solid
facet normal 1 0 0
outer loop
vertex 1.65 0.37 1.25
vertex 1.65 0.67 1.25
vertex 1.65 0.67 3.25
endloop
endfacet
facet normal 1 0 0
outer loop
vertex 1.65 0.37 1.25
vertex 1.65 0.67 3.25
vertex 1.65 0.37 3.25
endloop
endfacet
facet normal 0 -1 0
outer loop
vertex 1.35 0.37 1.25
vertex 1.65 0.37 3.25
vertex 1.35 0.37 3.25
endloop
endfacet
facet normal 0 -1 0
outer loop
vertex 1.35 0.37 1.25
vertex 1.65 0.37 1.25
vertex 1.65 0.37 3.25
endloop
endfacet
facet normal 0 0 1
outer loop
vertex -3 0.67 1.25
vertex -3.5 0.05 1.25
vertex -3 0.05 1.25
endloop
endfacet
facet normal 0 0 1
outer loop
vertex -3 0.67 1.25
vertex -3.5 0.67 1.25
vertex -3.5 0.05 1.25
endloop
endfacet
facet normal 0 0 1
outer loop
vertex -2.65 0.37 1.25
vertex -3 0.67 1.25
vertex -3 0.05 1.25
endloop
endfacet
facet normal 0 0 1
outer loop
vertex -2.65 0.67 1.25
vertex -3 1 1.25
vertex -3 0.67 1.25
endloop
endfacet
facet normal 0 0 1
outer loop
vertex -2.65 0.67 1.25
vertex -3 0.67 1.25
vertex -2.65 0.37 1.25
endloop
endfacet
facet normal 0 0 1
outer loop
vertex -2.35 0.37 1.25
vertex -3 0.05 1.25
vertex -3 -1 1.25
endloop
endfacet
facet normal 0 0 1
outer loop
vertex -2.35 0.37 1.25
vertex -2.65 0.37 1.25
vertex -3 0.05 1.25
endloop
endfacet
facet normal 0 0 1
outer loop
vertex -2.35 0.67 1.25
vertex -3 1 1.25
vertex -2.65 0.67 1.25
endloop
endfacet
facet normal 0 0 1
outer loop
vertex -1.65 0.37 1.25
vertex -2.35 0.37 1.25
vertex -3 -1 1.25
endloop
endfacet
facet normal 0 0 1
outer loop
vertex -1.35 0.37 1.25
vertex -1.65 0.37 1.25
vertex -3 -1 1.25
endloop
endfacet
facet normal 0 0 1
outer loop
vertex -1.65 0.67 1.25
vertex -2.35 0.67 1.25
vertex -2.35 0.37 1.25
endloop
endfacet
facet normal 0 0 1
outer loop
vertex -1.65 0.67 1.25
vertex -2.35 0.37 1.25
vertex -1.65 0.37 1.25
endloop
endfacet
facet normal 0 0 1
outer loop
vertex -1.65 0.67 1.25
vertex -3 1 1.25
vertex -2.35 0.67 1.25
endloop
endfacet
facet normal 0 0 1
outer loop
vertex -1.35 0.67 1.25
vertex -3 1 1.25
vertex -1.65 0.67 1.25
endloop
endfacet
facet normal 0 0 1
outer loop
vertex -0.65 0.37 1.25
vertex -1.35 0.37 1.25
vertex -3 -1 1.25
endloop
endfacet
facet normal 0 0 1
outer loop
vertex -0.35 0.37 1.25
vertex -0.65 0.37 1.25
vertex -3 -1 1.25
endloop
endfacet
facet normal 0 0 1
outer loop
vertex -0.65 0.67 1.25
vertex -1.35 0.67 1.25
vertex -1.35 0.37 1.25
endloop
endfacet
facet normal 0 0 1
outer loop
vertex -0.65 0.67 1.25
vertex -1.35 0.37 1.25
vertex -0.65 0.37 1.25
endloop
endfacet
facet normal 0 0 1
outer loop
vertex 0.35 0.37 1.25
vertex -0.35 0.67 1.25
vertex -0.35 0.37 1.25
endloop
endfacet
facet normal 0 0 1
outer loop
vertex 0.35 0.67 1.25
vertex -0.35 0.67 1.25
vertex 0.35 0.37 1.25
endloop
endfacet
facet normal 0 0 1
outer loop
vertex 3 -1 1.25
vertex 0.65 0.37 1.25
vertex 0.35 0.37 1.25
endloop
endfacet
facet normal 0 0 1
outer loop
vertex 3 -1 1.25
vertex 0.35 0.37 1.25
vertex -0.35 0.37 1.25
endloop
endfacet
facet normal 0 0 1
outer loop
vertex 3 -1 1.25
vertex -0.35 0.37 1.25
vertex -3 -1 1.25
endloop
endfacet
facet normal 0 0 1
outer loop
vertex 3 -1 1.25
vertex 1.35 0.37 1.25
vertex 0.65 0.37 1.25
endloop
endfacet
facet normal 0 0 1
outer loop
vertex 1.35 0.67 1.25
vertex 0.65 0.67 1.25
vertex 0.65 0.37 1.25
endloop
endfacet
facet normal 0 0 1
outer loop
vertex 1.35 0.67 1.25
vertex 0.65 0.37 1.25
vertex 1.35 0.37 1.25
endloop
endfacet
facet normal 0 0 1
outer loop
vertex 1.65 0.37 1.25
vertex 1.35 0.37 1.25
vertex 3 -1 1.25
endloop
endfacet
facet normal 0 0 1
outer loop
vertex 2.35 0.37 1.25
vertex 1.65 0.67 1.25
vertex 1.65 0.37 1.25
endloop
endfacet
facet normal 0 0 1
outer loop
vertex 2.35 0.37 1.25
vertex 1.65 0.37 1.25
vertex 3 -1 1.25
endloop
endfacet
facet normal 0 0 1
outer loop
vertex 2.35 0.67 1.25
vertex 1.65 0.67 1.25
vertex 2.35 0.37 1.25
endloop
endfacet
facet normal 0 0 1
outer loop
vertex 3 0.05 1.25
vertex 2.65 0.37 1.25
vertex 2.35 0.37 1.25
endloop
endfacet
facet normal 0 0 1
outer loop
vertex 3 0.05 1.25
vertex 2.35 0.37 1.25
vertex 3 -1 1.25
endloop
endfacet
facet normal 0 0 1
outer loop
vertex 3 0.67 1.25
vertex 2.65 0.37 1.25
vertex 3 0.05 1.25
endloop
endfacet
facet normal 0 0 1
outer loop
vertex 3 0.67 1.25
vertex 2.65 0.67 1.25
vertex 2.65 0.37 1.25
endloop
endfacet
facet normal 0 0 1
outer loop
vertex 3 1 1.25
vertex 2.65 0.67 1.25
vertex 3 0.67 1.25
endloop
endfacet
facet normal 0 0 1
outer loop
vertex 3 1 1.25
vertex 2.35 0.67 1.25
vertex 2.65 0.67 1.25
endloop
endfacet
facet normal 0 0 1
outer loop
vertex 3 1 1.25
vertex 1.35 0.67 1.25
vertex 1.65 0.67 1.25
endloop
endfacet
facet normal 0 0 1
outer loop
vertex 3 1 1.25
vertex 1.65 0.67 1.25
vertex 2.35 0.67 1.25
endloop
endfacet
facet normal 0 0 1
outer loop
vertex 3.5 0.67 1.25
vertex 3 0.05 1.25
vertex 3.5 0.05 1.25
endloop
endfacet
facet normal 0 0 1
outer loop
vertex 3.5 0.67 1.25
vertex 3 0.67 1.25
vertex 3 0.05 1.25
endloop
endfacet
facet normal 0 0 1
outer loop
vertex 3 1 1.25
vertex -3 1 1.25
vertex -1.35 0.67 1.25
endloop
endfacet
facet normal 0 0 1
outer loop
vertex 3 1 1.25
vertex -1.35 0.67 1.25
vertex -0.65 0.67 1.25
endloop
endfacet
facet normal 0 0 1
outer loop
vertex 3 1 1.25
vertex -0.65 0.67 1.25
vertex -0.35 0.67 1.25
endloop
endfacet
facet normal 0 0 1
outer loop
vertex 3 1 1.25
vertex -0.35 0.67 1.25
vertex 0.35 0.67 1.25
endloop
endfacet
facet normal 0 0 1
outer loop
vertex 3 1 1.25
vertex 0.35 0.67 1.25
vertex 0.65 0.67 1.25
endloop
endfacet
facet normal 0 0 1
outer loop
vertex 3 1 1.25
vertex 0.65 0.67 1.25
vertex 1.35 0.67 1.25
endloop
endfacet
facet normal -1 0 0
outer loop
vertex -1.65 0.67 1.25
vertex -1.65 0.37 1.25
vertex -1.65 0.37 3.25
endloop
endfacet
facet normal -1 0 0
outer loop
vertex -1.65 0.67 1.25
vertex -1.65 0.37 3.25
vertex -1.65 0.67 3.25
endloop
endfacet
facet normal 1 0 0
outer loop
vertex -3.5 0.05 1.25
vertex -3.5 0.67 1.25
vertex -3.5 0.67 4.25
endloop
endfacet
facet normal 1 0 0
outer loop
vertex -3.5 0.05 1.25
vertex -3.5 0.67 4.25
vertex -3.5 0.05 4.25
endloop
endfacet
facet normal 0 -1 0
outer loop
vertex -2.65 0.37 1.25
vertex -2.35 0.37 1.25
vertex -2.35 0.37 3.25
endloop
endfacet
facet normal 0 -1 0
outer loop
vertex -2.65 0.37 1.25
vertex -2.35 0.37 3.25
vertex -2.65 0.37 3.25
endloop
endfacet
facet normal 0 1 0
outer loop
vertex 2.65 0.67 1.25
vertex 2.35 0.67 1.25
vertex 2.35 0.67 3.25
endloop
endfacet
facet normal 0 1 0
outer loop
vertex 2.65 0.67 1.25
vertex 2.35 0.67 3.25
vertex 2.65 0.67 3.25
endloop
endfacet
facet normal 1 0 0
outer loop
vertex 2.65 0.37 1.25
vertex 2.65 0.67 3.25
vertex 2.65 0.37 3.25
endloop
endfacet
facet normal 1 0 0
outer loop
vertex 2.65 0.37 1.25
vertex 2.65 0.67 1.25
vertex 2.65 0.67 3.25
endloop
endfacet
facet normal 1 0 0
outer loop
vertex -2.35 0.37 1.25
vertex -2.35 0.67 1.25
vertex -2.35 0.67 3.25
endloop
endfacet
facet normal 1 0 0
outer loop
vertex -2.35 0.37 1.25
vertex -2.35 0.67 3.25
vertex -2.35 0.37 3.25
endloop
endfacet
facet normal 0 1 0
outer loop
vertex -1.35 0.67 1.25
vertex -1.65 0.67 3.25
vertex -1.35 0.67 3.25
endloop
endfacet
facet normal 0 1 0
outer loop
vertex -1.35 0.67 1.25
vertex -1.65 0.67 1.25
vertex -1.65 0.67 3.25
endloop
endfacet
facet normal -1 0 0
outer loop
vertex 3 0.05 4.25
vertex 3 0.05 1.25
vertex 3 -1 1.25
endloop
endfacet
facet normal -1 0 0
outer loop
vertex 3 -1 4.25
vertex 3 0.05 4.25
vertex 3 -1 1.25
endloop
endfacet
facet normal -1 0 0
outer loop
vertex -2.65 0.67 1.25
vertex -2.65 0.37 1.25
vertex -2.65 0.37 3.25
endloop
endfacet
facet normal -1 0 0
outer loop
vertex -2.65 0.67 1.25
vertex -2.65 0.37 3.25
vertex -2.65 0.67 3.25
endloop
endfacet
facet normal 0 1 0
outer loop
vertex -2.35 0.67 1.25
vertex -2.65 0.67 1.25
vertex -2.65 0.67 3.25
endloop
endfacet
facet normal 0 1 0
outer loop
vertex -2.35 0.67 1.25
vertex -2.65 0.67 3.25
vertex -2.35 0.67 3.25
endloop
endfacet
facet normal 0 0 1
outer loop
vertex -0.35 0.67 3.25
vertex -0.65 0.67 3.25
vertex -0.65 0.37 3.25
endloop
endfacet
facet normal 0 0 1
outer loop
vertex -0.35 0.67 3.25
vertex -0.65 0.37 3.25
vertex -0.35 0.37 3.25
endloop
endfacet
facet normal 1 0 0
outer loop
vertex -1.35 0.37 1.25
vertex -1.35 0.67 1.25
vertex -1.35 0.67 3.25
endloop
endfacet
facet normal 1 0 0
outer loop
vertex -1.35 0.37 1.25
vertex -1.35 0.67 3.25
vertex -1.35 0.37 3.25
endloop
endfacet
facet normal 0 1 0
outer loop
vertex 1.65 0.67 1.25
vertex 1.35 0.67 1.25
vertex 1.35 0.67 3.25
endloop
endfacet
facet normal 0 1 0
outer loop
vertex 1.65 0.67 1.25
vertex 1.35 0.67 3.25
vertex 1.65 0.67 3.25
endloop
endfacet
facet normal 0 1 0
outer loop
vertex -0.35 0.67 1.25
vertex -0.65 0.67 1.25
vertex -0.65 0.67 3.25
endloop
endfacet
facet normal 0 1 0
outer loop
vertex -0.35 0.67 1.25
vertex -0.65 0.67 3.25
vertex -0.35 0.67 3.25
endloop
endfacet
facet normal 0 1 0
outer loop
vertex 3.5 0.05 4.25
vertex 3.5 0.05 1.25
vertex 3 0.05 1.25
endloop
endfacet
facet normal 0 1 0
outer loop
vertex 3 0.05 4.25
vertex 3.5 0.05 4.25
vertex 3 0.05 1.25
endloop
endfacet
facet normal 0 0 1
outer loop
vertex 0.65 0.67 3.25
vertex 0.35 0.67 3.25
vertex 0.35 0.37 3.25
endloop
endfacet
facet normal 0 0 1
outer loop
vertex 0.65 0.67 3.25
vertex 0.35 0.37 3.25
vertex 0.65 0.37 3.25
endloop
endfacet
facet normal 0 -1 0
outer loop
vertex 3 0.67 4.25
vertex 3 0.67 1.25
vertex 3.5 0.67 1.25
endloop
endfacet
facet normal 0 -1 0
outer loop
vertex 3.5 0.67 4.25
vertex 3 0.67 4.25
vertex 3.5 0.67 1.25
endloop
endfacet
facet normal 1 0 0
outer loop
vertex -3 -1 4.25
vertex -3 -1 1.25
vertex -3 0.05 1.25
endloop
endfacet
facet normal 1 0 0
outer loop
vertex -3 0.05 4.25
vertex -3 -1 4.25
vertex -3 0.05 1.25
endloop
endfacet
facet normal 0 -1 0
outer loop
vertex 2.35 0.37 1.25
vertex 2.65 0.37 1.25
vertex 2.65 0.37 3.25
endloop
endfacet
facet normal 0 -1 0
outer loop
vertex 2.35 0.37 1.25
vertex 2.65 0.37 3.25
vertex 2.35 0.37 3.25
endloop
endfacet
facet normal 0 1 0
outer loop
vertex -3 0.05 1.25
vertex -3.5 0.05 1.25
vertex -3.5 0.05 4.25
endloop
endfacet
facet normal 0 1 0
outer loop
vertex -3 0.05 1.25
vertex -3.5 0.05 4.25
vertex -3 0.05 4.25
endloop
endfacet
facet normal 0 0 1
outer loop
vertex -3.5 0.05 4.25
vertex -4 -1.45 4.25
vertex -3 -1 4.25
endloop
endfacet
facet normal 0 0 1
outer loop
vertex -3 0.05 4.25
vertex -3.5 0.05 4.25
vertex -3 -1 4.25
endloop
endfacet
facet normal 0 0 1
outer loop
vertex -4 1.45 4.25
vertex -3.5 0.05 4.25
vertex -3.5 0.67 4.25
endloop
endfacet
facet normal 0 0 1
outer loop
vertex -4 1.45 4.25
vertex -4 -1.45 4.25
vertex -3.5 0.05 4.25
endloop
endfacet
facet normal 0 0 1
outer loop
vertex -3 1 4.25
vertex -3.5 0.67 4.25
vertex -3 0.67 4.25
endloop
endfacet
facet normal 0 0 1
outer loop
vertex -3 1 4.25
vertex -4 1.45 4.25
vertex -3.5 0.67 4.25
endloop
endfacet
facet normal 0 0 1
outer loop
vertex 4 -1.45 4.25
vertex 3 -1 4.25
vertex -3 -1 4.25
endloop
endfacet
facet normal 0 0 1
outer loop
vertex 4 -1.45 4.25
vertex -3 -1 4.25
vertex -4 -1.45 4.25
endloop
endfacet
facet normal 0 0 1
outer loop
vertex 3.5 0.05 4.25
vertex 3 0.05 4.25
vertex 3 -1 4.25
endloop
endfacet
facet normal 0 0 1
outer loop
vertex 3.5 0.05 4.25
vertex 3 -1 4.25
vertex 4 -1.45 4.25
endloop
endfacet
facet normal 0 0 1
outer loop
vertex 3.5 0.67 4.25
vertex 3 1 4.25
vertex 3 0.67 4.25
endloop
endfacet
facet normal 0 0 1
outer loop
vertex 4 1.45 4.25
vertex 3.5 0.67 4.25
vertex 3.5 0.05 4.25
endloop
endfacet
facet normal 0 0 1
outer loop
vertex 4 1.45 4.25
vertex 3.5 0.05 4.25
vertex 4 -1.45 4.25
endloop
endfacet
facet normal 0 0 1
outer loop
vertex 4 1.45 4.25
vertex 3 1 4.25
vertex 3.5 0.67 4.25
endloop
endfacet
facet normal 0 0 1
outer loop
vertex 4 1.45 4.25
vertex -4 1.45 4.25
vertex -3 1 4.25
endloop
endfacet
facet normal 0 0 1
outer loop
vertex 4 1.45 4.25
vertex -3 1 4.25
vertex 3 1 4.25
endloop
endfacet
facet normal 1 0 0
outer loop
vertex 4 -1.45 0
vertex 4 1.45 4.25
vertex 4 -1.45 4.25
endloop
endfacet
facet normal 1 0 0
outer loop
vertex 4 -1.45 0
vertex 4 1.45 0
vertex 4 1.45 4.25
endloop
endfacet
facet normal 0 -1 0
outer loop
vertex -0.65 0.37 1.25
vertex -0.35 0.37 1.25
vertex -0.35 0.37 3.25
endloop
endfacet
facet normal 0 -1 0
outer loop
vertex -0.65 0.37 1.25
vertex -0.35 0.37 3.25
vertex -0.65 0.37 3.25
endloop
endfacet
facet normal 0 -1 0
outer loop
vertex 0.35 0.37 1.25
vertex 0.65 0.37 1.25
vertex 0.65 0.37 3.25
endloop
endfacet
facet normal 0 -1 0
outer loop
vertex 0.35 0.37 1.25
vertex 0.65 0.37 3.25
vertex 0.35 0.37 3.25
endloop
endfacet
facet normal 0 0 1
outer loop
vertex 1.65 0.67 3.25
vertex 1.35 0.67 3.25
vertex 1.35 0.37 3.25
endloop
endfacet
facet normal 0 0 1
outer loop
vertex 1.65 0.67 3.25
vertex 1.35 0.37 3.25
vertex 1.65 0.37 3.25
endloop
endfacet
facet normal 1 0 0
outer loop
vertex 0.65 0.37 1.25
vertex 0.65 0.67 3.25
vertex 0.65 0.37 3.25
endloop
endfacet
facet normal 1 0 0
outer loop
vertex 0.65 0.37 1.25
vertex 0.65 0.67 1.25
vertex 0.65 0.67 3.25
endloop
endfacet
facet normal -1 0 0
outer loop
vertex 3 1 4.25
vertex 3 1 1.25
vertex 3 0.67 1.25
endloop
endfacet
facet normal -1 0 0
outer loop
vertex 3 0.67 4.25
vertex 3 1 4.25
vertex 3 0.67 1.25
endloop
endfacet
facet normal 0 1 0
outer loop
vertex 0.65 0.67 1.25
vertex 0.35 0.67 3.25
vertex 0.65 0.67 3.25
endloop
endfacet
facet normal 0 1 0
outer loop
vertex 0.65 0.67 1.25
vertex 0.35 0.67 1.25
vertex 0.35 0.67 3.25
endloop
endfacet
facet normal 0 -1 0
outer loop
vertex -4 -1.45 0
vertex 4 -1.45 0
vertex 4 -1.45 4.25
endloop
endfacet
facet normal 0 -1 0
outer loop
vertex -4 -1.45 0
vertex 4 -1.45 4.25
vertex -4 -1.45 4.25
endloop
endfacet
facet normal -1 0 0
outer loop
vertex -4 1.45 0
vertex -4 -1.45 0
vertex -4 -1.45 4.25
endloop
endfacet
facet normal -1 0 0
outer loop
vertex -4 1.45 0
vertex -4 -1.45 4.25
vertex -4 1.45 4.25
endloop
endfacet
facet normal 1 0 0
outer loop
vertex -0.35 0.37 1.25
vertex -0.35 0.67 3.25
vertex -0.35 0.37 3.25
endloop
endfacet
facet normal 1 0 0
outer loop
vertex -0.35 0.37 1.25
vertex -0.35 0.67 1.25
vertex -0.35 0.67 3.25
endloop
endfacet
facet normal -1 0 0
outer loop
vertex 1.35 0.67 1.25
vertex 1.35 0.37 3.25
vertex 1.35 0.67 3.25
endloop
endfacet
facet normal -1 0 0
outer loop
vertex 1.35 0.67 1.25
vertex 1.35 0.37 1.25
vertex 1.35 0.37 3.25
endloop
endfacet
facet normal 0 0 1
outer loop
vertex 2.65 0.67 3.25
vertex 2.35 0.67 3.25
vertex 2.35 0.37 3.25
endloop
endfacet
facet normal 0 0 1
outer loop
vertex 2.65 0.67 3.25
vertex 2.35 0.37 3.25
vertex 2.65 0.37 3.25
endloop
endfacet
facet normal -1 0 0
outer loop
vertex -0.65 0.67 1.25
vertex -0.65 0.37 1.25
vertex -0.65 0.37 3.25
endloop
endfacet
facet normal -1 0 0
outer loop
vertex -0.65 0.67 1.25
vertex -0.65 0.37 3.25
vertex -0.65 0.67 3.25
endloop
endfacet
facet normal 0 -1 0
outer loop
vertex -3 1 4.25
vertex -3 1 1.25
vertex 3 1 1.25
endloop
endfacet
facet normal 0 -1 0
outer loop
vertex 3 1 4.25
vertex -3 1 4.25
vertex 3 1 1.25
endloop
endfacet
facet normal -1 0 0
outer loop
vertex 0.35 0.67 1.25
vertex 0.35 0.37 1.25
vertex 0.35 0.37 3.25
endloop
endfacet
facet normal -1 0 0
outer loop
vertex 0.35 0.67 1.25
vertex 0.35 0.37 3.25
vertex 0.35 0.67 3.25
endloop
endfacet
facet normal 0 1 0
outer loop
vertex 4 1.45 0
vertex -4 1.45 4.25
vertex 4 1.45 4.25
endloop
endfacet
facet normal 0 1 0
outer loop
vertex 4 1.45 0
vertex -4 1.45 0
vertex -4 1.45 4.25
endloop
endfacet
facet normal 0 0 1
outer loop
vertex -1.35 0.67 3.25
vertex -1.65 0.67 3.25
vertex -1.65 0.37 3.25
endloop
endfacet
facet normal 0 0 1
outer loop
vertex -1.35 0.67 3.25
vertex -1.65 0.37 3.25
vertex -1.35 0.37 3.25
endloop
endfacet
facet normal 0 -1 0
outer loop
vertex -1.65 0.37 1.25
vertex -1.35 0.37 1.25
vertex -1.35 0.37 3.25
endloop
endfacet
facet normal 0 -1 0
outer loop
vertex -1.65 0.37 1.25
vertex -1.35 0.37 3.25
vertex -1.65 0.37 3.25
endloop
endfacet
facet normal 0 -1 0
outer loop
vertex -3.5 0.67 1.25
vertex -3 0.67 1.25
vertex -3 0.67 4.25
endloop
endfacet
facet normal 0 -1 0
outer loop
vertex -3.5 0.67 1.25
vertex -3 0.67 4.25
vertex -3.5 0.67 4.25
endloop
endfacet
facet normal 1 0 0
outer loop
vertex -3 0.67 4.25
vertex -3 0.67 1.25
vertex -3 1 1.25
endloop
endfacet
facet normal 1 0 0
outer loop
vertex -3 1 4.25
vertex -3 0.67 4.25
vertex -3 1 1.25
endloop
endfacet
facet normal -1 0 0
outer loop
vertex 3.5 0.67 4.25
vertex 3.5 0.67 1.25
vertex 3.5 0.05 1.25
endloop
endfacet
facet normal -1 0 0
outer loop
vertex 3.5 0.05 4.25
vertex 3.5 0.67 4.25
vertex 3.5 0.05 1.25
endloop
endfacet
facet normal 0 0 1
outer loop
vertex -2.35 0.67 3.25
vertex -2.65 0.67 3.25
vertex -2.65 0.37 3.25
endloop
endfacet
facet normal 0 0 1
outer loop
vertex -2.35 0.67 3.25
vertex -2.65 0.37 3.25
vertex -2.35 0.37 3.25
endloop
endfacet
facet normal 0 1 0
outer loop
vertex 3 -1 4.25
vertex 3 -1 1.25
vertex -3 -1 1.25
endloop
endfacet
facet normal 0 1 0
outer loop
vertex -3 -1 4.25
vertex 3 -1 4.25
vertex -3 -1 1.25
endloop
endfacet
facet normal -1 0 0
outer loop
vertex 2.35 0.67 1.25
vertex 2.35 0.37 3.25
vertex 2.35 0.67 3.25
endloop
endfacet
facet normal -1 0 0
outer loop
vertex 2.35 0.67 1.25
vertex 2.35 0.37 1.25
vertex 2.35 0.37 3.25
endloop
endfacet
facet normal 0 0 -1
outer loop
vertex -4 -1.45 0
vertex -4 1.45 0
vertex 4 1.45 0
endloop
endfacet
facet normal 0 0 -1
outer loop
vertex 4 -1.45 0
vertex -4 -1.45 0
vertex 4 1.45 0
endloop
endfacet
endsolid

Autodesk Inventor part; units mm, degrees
ref_plane "YZ Plane" through (0, 0, 0) normal (1, 0, 0) x (0, 1, 0)
ref_plane "XZ Plane" through (0, 0, 0) normal (0, 1, 0) x (-1, 0, 0)
ref_plane "XY Plane" through (0, 0, 0) normal (0, 0, 1) x (1, 0, 0)
sketch "Náčrt1" plane through (0, 0, 0) normal (0, 0, 1) x (1, 0, 0)
  line L0 (-4, 1.45) -> (4, 1.45)
  line L1 (4, 1.45) -> (4, -1.45)
  line L2 (4, -1.45) -> (-4, -1.45)
  line L3 (-4, -1.45) -> (-4, 1.45)
  line L4 (-4, 1.45) -> (4, -1.45) construction
  line L5 (4, 1.45) -> (-4, -1.45) construction
  line L6 (-3, 1) -> (3, 1)
  line L7 (3, 1) -> (3, -1)
  line L8 (3, -1) -> (-3, -1)
  line L9 (-3, -1) -> (-3, 1)
  line L10 (-3, 1) -> (3, -1) construction
  line L11 (3, 1) -> (-3, -1) construction
  line L12 (-3, 0.67) -> (-3.5, 0.67)
  line L13 (-3.5, 0.67) -> (-3.5, 0.05)
  line L14 (-3.5, 0.05) -> (-3, 0.05)
  line L15 (3, 0.67) -> (3.5, 0.67)
  line L16 (3.5, 0.67) -> (3.5, 0.05)
  line L17 (3.5, 0.05) -> (3, 0.05)
  point P0 (0, 0)
  dimension "d0" = 8
  dimension "d1" = 2.9
  dimension "d2" = 2
  dimension "d3" = 6
  dimension "d4" = 7
  dimension "d5" = 0.62
  dimension "d6" = 1.5
extrude "Vysunutí1" add sketch "Náčrt1" along normal blind 4.25
extrude "Vysunutí2" add sketch "Náčrt1" along normal blind 1.25 contours L6 L7 L8 L9 | L9 L14 L13 L12 | L15 L16 L17 L7
sketch "Náčrt2" plane through (0, 0, 1.25) normal (0, 0, 1) x (1, 0, 0)
  line L0 (-2.65, 0.67) -> (-2.35, 0.67)
  line L1 (-2.35, 0.67) -> (-2.35, 0.37)
  line L2 (-2.35, 0.37) -> (-2.65, 0.37)
  line L3 (-2.65, 0.37) -> (-2.65, 0.67)
  line L4 (-2.65, 0.67) -> (-2.35, 0.37) construction
  line L5 (-2.35, 0.67) -> (-2.65, 0.37) construction
  line L6 (-1.65, 0.67) -> (-1.35, 0.67)
  line L7 (-1.35, 0.67) -> (-1.35, 0.37)
  line L8 (-1.35, 0.37) -> (-1.65, 0.37)
  line L9 (-1.65, 0.37) -> (-1.65, 0.67)
  line L10 (-1.65, 0.67) -> (-1.35, 0.37) construction
  line L11 (-1.35, 0.67) -> (-1.65, 0.37) construction
  line L12 (-0.65, 0.67) -> (-0.35, 0.67)
  line L13 (-0.35, 0.67) -> (-0.35, 0.37)
  line L14 (-0.35, 0.37) -> (-0.65, 0.37)
  line L15 (-0.65, 0.37) -> (-0.65, 0.67)
  line L16 (-0.65, 0.67) -> (-0.35, 0.37) construction
  line L17 (-0.35, 0.67) -> (-0.65, 0.37) construction
  line L18 (0.35, 0.67) -> (0.65, 0.67)
  line L19 (0.65, 0.67) -> (0.65, 0.37)
  line L20 (0.65, 0.37) -> (0.35, 0.37)
  line L21 (0.35, 0.37) -> (0.35, 0.67)
  line L22 (0.35, 0.67) -> (0.65, 0.37) construction
  line L23 (0.65, 0.67) -> (0.35, 0.37) construction
  line L24 (1.35, 0.67) -> (1.65, 0.67)
  line L25 (1.65, 0.67) -> (1.65, 0.37)
  line L26 (1.65, 0.37) -> (1.35, 0.37)
  line L27 (1.35, 0.37) -> (1.35, 0.67)
  line L28 (1.35, 0.67) -> (1.65, 0.37) construction
  line L29 (1.65, 0.67) -> (1.35, 0.37) construction
  line L30 (2.35, 0.67) -> (2.65, 0.67)
  line L31 (2.65, 0.67) -> (2.65, 0.37)
  line L32 (2.65, 0.37) -> (2.35, 0.37)
  line L33 (2.35, 0.37) -> (2.35, 0.67)
  line L34 (2.35, 0.67) -> (2.65, 0.37) construction
  line L35 (2.65, 0.67) -> (2.35, 0.37) construction
  line L36 (-3, -1) -> (-3, 0.05) projected
  line L37 (-3, 0.37) -> (-2.65, 0.37) construction
  line L38 (2.65, 0.37) -> (3, 0.37) construction
  line L39 (3, 0.05) -> (3, -1) construction
  point P0 (0, 0)
  point P1 (-2.5, 0.52)
  point P2 (-1.5, 0.52)
  point P3 (-0.5, 0.52)
  point P4 (0.5, 0.52)
  point P5 (1.5, 0.52)
  point P6 (2.5, 0.52)
  point P7 (-3, 0.67)
  dimension "d13" = 1
  dimension "d19" = 0.3
  dimension "d20" = 0.3
extrude "Vysunutí3" add sketch "Náčrt2" along normal blind 2
properties part number "jst - 1 mm 6 pin female"
